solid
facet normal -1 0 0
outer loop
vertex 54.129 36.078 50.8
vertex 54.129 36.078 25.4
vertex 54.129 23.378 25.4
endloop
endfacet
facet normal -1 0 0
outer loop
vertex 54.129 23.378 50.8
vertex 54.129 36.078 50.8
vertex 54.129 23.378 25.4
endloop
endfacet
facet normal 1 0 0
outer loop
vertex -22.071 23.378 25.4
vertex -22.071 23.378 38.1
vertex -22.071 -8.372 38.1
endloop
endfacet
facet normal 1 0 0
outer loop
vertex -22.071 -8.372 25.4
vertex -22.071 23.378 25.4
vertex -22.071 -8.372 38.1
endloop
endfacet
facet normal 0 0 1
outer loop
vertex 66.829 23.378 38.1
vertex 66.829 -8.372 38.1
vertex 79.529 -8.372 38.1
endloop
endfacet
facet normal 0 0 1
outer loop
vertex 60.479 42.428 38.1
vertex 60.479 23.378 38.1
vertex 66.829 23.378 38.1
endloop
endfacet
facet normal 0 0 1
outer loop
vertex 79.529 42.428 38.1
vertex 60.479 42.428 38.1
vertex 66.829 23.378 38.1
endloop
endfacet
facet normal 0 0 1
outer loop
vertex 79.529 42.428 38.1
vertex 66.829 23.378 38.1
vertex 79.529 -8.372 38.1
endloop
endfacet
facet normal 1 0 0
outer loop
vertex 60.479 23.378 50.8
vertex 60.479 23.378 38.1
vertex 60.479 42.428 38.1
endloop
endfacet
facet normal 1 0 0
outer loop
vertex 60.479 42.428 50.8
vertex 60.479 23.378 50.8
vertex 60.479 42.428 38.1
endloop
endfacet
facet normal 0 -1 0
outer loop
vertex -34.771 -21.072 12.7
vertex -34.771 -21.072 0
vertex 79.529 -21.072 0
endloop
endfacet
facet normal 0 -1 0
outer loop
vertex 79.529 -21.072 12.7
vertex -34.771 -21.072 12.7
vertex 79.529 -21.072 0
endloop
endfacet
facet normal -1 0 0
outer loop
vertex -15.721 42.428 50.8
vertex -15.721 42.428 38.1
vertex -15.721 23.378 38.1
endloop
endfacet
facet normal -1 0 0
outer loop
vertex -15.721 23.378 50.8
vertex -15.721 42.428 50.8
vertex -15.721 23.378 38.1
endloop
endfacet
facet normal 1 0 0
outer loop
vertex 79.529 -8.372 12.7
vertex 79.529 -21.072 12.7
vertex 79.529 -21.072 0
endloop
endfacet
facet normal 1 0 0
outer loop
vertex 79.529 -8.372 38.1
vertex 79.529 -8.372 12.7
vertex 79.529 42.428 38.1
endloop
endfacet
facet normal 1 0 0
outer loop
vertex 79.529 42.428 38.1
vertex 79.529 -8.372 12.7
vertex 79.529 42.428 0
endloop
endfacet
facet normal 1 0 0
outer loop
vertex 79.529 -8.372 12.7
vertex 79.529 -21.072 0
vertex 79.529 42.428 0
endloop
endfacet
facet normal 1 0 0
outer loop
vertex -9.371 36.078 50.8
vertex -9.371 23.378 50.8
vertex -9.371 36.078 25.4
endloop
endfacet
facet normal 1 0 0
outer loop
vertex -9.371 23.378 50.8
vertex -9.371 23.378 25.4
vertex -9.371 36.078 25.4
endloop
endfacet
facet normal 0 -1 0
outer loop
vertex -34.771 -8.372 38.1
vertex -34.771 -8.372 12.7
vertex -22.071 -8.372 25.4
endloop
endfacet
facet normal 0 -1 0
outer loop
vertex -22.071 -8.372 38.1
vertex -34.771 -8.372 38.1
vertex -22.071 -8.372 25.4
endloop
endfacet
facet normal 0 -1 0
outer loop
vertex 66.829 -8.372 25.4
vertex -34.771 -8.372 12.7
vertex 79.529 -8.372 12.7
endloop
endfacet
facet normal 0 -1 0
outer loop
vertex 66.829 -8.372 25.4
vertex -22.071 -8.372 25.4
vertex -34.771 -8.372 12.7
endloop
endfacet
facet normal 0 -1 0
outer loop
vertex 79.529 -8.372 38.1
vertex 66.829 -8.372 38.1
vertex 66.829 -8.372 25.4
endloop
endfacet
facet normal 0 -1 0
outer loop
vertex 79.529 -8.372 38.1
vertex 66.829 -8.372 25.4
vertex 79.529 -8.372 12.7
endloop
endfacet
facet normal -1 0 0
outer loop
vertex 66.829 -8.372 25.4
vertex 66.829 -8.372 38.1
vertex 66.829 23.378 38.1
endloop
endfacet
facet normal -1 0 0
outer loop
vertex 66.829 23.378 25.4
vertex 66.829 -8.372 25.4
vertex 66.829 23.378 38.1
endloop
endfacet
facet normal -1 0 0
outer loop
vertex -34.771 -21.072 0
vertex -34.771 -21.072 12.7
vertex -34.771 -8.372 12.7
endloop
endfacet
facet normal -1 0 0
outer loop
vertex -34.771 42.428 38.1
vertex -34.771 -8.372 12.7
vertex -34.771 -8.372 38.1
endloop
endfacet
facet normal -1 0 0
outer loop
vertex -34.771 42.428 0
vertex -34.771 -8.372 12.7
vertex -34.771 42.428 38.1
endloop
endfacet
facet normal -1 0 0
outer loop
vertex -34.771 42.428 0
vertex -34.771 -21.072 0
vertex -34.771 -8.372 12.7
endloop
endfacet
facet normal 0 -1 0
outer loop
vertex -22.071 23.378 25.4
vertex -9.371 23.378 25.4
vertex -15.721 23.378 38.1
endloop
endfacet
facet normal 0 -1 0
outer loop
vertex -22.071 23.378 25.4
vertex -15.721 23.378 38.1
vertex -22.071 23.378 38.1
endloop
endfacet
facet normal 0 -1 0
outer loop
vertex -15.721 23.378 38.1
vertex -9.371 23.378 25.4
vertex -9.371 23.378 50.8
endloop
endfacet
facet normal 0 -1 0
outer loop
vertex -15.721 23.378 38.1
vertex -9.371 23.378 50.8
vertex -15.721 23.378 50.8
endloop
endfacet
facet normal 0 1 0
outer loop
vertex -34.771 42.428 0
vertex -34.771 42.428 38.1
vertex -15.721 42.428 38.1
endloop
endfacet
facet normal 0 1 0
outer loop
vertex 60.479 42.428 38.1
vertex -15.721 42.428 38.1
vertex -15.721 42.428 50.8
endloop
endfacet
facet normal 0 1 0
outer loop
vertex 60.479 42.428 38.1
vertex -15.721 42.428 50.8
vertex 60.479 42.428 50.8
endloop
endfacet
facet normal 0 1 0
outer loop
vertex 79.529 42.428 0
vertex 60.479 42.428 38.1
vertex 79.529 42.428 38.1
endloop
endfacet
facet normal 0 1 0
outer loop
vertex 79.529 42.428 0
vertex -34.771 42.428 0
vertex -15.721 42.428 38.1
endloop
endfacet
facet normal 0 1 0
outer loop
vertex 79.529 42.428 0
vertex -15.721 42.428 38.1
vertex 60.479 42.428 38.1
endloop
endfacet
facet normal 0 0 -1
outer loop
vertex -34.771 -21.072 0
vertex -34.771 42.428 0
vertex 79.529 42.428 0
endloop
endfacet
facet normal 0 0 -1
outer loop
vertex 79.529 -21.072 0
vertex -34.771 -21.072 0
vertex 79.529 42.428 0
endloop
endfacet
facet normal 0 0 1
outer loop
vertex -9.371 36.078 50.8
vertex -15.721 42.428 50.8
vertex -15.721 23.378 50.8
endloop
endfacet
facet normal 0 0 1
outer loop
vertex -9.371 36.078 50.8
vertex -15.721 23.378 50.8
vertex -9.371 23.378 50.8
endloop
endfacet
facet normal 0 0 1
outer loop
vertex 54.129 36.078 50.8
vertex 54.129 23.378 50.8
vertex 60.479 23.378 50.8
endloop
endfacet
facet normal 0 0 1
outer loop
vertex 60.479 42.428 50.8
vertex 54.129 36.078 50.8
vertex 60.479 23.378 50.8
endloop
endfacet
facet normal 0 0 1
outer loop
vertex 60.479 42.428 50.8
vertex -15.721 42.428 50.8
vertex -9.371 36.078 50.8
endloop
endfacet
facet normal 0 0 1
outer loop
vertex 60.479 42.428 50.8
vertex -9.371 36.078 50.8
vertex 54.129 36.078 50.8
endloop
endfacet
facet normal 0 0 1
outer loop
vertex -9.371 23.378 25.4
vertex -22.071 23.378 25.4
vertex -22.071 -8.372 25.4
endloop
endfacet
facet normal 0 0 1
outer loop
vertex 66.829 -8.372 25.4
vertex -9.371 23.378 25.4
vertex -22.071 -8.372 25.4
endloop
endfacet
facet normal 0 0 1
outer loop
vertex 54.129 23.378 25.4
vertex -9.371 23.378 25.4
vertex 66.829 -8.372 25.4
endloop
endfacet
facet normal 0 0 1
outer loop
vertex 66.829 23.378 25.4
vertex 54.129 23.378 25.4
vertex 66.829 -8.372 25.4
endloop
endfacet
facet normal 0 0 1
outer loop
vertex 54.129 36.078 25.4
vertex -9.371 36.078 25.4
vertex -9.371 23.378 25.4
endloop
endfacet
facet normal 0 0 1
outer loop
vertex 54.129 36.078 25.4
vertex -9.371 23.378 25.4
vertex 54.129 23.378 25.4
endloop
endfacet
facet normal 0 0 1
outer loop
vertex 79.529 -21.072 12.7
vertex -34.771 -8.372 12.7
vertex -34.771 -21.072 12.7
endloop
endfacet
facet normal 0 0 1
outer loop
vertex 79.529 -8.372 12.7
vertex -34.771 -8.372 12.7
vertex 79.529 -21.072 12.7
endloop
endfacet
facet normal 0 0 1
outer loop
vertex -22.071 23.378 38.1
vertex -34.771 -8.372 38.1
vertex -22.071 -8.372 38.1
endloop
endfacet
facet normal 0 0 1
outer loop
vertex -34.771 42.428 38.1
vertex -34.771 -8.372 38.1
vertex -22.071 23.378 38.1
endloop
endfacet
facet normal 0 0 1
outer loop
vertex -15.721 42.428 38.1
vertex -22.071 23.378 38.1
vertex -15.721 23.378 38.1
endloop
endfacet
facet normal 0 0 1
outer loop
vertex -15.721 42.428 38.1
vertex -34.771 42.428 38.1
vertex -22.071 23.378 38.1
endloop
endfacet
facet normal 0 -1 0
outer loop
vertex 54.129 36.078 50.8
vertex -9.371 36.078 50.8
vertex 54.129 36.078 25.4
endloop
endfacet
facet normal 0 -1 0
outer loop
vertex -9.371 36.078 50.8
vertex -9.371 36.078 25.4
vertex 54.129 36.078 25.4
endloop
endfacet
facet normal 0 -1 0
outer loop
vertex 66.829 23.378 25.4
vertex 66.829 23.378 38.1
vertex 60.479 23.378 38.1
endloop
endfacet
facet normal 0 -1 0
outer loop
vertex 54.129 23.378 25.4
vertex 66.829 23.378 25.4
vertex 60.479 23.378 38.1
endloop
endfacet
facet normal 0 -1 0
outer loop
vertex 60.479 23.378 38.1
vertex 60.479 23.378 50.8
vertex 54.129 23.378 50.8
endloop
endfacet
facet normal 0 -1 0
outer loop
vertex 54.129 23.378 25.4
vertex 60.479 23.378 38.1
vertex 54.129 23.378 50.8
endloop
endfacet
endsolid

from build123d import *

# Parameters (mm, degrees)
F0_W     = 114.3
F0_H     = 63.5
F1_DEPTH = 38.1
F2_W     = 63.5
F2_H     = 6.35
F3_DEPTH = 12.7
F4_W     = 63.5
F4_H     = 12.7
F5_DEPTH = 12.7
F6_W     = 114.3
F6_H     = 12.7
F7_DEPTH = 25.4


with BuildPart() as f1:
    # F0 (on Top) → F1 (new body)
    with BuildSketch(Plane.XY):
        with Locations((22.379107, 10.678026)):
            Rectangle(F0_W, F0_H)
    extrude(amount=F1_DEPTH)

    # F2 (on face) → F3 (join)
    with BuildSketch(Plane.XY.offset(38.1)):
        Polygon((54.129107, 42.428026), (54.129107, 36.078026), (54.129107, 23.378026), (60.479107, 23.378026), (60.479107, 42.428026), align=None)
        with Locations((22.379107, 39.253026)):
            Rectangle(F2_W, F2_H)
        Polygon((-15.720893, 42.428026), (-15.720893, 23.378026), (-9.370893, 23.378026), (-9.370893, 36.078026), (-9.370893, 42.428026), align=None)
    extrude(amount=F3_DEPTH)

    # F4 (on face) → F5 (cut)
    with BuildSketch(Plane.XY.offset(38.1)):
        with Locations((22.379107, 29.728026)):
            Rectangle(F4_W, F4_H)
        Polygon((-15.720893, 23.378026), (-22.070893, 23.378026), (-22.070893, -8.371974), (66.829107, -8.371974), (66.829107, 23.378026), (60.479107, 23.378026), (54.129107, 23.378026), (-9.370893, 23.378026), align=None)
    extrude(amount=-F5_DEPTH, mode=Mode.SUBTRACT)

    # F6 (on face) → F7 (cut)
    with BuildSketch(Plane.XY.offset(38.1)):
        with Locations((22.379107, -14.721974)):
            Rectangle(F6_W, F6_H)
    extrude(amount=-F7_DEPTH, mode=Mode.SUBTRACT)


solid = f1.part
